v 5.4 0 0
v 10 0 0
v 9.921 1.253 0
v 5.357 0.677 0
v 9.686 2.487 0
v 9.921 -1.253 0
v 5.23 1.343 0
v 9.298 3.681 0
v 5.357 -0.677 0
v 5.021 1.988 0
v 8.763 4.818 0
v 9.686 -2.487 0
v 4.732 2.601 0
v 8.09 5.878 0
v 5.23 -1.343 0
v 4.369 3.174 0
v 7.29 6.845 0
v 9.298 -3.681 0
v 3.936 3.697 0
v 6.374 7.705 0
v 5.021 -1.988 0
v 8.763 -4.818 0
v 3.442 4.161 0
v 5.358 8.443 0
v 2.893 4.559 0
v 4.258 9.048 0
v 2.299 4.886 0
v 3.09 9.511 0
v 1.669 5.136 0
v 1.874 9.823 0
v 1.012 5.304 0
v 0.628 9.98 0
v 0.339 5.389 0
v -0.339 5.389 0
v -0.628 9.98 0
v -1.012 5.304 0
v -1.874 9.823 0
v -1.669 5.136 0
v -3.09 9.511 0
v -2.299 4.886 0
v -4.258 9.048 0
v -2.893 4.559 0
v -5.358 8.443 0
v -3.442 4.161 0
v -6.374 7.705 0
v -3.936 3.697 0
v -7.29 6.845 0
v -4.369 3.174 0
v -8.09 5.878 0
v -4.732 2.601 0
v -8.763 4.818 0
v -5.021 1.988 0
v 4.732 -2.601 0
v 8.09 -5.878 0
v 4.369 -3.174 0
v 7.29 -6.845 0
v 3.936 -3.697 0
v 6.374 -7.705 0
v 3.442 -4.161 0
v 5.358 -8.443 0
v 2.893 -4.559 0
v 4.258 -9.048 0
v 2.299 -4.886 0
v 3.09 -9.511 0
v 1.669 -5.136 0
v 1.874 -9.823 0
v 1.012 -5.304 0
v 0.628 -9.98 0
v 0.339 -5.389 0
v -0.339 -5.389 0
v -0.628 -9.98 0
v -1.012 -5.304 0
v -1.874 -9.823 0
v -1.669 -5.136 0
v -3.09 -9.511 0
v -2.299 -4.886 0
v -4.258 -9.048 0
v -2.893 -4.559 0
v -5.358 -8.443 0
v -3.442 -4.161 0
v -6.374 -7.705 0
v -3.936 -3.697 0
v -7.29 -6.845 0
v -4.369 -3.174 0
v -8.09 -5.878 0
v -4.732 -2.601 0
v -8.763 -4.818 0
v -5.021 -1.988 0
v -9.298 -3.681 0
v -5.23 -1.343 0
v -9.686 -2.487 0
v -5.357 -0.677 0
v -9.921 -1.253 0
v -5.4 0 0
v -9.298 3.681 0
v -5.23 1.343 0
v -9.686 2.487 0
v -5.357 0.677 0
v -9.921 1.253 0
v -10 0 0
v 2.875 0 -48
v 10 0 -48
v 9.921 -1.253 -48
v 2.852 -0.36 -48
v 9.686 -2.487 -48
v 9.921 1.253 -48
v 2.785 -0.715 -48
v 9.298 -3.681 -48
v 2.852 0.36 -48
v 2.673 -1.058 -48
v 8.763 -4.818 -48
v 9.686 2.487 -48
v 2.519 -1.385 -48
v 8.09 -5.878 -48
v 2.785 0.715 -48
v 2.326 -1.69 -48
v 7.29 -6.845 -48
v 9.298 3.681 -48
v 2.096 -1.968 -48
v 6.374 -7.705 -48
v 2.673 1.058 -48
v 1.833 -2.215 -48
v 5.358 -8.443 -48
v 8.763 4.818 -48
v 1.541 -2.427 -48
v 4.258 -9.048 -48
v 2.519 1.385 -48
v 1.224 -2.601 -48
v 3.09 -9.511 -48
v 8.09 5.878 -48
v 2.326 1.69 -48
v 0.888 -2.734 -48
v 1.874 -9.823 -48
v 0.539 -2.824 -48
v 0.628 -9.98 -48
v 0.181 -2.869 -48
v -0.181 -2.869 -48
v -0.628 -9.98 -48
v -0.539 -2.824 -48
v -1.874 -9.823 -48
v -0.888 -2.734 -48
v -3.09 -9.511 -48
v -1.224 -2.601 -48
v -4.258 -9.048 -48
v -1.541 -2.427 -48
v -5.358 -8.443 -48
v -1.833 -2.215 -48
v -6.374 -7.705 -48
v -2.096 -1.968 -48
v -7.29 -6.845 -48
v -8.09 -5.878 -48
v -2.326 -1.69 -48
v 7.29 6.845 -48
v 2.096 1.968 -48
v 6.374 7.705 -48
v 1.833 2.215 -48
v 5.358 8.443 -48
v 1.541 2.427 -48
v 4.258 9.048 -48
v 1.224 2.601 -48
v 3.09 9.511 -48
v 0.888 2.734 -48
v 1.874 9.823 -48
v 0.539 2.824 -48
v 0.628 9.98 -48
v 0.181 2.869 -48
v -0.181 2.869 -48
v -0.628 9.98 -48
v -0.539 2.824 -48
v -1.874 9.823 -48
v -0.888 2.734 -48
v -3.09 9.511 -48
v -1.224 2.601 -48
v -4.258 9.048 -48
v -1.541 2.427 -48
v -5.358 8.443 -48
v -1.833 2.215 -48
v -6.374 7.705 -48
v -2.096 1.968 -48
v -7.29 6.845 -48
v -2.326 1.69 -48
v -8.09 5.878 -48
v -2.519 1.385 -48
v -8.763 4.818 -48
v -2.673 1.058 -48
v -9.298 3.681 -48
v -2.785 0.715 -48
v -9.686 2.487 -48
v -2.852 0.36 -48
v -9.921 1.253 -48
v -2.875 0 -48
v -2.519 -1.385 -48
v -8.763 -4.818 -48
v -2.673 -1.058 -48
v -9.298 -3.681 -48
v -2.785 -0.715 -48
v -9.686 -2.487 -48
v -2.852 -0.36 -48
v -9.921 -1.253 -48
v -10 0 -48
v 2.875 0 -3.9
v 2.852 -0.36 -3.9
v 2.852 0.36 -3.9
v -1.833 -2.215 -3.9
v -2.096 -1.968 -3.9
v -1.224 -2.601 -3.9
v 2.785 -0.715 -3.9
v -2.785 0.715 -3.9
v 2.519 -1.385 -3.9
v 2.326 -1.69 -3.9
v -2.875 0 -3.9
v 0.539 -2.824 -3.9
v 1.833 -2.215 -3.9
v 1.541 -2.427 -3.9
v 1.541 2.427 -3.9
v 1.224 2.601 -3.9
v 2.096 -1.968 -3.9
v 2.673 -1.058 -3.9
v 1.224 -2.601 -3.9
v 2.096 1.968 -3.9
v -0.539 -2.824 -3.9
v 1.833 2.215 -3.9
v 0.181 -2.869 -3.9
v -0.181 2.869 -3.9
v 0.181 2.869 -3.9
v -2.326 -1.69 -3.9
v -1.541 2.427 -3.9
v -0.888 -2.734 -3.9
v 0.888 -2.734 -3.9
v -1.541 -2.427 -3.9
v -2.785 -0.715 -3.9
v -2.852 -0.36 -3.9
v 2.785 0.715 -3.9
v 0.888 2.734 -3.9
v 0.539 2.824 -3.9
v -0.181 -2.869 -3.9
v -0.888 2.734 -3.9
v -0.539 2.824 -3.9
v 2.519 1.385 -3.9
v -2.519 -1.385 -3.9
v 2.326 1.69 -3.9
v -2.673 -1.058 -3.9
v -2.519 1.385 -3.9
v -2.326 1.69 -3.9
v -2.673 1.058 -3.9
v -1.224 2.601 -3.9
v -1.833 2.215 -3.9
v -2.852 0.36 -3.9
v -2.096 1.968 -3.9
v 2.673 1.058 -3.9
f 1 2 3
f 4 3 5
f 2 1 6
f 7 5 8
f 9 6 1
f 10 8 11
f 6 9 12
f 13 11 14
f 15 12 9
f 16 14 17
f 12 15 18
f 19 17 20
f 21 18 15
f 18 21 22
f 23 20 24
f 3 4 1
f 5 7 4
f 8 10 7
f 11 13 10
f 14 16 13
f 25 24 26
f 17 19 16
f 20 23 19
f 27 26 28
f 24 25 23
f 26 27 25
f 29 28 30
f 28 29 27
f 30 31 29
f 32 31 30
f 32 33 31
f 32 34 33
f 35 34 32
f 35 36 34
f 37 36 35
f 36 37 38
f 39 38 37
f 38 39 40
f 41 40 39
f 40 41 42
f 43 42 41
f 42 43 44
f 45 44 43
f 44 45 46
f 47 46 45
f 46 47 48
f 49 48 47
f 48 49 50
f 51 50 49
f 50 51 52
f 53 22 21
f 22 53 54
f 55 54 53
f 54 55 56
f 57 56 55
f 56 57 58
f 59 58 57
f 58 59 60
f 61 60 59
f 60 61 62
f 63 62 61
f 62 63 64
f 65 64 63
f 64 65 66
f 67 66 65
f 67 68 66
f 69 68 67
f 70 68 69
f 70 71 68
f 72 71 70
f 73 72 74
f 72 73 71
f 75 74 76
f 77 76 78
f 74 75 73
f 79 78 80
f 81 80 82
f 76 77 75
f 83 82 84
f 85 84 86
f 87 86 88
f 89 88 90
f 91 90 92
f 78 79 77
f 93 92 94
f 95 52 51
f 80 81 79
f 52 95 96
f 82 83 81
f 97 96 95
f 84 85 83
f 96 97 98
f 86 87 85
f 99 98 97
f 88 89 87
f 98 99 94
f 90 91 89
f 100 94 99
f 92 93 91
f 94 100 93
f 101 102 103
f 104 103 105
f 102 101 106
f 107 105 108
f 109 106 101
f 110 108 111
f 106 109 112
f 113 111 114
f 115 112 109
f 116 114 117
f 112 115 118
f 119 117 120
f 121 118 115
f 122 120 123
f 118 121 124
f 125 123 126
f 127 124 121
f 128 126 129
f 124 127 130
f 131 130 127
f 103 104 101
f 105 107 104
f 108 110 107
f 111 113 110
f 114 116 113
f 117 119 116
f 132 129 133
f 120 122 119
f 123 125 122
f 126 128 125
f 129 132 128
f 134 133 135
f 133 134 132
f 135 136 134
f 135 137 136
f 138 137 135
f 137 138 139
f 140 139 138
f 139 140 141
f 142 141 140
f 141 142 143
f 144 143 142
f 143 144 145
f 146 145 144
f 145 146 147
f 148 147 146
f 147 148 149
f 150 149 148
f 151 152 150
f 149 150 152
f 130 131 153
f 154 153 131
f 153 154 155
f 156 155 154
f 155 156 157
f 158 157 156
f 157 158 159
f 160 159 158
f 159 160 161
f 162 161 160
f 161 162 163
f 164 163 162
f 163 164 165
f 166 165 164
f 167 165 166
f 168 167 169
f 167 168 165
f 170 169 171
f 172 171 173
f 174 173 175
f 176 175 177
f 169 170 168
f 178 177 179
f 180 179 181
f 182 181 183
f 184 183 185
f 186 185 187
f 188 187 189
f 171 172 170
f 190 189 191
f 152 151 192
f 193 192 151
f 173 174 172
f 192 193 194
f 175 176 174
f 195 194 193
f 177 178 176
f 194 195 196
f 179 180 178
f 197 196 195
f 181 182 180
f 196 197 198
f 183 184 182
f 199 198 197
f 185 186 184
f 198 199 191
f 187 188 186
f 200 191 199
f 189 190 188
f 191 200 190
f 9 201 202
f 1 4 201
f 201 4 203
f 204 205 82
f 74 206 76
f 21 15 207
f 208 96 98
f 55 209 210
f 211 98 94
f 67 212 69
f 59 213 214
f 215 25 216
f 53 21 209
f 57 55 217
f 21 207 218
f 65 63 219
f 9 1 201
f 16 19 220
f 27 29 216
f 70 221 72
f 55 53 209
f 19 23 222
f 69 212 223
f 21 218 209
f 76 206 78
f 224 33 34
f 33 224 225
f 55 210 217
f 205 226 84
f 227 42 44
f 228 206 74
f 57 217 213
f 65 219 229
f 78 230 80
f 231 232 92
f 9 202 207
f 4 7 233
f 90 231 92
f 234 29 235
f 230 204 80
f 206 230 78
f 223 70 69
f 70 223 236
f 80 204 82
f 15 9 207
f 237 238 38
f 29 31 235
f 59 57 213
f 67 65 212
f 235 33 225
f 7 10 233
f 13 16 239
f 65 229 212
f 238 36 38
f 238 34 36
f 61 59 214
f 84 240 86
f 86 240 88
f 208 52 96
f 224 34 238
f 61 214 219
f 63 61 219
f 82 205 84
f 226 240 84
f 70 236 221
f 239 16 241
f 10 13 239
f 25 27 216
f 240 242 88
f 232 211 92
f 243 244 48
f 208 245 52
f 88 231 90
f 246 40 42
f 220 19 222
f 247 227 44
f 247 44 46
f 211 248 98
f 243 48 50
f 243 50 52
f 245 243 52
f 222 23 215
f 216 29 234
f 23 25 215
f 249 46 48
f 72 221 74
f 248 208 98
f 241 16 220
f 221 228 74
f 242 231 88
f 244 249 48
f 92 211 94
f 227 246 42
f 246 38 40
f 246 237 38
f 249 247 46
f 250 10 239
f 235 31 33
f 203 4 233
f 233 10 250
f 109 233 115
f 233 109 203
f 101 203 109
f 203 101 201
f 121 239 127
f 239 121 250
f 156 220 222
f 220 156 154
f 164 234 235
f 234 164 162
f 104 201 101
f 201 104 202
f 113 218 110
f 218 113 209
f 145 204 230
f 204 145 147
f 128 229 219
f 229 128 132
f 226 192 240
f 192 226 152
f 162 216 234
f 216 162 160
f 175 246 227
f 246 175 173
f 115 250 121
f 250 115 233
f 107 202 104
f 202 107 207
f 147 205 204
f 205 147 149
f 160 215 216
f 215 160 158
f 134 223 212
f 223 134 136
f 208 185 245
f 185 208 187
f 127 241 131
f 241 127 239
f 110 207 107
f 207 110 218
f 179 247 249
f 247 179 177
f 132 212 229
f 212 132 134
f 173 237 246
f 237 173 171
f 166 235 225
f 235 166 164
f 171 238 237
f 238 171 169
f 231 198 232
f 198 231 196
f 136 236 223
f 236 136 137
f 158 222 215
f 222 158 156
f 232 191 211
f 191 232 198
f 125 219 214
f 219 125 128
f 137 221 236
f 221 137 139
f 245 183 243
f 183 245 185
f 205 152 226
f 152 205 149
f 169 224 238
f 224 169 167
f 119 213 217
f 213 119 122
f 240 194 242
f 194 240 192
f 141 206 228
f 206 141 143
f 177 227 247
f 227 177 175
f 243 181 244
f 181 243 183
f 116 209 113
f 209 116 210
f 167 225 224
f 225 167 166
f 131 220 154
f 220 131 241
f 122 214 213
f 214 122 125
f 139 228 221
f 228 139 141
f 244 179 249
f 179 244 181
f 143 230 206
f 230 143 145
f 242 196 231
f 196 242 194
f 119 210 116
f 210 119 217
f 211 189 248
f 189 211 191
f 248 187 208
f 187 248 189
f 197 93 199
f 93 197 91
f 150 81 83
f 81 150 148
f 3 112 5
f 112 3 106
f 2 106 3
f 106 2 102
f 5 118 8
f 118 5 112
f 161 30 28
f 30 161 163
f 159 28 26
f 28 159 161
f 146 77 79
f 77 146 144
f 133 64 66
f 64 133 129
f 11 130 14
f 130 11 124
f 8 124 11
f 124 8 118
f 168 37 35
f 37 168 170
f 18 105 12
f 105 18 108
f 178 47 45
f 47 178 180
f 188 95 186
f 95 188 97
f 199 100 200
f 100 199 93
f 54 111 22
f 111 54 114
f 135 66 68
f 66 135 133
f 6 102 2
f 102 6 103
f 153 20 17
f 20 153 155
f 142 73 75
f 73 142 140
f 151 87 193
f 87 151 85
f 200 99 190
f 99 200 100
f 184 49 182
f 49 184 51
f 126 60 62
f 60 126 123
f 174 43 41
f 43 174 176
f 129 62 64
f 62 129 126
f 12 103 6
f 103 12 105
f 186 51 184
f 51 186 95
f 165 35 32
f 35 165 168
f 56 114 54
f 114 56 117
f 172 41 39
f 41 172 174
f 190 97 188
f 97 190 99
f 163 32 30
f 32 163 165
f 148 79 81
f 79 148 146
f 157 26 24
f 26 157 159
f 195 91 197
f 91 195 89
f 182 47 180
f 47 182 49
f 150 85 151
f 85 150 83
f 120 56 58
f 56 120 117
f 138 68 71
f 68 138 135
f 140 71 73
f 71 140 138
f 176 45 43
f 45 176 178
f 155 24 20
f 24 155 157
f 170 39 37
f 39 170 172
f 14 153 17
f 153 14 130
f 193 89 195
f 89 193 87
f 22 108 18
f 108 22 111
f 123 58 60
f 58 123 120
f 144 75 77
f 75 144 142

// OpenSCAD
$fn = 50;


difference() {
	union() {
		translate(v = [0, 0, -48.0000000000]) {
			cylinder(h = 48, r = 10.0000000000);
		}
		cylinder(h = 0, r = 16.0000000000);
	}
	union() {
		translate(v = [0, 0, 0]) {
			rotate(a = [0, 0, 0]) {
				difference() {
					union() {
						#translate(v = [0, 0, -48.0000000000]) {
							cylinder(h = 48, r = 2.6000000000);
						}
						#translate(v = [0, 0, -3.9000000000]) {
							cylinder(h = 3.9000000000, r = 10.0000000000, r1 = 2.8750000000, r2 = 5.4000000000);
						}
						#translate(v = [0, 0, -48.0000000000]) {
							cylinder(h = 48, r = 2.8750000000);
						}
						#translate(v = [0, 0, -48.0000000000]) {
							cylinder(h = 48, r = 2.6000000000);
						}
					}
					union();
				}
			}
		}
	}
}
